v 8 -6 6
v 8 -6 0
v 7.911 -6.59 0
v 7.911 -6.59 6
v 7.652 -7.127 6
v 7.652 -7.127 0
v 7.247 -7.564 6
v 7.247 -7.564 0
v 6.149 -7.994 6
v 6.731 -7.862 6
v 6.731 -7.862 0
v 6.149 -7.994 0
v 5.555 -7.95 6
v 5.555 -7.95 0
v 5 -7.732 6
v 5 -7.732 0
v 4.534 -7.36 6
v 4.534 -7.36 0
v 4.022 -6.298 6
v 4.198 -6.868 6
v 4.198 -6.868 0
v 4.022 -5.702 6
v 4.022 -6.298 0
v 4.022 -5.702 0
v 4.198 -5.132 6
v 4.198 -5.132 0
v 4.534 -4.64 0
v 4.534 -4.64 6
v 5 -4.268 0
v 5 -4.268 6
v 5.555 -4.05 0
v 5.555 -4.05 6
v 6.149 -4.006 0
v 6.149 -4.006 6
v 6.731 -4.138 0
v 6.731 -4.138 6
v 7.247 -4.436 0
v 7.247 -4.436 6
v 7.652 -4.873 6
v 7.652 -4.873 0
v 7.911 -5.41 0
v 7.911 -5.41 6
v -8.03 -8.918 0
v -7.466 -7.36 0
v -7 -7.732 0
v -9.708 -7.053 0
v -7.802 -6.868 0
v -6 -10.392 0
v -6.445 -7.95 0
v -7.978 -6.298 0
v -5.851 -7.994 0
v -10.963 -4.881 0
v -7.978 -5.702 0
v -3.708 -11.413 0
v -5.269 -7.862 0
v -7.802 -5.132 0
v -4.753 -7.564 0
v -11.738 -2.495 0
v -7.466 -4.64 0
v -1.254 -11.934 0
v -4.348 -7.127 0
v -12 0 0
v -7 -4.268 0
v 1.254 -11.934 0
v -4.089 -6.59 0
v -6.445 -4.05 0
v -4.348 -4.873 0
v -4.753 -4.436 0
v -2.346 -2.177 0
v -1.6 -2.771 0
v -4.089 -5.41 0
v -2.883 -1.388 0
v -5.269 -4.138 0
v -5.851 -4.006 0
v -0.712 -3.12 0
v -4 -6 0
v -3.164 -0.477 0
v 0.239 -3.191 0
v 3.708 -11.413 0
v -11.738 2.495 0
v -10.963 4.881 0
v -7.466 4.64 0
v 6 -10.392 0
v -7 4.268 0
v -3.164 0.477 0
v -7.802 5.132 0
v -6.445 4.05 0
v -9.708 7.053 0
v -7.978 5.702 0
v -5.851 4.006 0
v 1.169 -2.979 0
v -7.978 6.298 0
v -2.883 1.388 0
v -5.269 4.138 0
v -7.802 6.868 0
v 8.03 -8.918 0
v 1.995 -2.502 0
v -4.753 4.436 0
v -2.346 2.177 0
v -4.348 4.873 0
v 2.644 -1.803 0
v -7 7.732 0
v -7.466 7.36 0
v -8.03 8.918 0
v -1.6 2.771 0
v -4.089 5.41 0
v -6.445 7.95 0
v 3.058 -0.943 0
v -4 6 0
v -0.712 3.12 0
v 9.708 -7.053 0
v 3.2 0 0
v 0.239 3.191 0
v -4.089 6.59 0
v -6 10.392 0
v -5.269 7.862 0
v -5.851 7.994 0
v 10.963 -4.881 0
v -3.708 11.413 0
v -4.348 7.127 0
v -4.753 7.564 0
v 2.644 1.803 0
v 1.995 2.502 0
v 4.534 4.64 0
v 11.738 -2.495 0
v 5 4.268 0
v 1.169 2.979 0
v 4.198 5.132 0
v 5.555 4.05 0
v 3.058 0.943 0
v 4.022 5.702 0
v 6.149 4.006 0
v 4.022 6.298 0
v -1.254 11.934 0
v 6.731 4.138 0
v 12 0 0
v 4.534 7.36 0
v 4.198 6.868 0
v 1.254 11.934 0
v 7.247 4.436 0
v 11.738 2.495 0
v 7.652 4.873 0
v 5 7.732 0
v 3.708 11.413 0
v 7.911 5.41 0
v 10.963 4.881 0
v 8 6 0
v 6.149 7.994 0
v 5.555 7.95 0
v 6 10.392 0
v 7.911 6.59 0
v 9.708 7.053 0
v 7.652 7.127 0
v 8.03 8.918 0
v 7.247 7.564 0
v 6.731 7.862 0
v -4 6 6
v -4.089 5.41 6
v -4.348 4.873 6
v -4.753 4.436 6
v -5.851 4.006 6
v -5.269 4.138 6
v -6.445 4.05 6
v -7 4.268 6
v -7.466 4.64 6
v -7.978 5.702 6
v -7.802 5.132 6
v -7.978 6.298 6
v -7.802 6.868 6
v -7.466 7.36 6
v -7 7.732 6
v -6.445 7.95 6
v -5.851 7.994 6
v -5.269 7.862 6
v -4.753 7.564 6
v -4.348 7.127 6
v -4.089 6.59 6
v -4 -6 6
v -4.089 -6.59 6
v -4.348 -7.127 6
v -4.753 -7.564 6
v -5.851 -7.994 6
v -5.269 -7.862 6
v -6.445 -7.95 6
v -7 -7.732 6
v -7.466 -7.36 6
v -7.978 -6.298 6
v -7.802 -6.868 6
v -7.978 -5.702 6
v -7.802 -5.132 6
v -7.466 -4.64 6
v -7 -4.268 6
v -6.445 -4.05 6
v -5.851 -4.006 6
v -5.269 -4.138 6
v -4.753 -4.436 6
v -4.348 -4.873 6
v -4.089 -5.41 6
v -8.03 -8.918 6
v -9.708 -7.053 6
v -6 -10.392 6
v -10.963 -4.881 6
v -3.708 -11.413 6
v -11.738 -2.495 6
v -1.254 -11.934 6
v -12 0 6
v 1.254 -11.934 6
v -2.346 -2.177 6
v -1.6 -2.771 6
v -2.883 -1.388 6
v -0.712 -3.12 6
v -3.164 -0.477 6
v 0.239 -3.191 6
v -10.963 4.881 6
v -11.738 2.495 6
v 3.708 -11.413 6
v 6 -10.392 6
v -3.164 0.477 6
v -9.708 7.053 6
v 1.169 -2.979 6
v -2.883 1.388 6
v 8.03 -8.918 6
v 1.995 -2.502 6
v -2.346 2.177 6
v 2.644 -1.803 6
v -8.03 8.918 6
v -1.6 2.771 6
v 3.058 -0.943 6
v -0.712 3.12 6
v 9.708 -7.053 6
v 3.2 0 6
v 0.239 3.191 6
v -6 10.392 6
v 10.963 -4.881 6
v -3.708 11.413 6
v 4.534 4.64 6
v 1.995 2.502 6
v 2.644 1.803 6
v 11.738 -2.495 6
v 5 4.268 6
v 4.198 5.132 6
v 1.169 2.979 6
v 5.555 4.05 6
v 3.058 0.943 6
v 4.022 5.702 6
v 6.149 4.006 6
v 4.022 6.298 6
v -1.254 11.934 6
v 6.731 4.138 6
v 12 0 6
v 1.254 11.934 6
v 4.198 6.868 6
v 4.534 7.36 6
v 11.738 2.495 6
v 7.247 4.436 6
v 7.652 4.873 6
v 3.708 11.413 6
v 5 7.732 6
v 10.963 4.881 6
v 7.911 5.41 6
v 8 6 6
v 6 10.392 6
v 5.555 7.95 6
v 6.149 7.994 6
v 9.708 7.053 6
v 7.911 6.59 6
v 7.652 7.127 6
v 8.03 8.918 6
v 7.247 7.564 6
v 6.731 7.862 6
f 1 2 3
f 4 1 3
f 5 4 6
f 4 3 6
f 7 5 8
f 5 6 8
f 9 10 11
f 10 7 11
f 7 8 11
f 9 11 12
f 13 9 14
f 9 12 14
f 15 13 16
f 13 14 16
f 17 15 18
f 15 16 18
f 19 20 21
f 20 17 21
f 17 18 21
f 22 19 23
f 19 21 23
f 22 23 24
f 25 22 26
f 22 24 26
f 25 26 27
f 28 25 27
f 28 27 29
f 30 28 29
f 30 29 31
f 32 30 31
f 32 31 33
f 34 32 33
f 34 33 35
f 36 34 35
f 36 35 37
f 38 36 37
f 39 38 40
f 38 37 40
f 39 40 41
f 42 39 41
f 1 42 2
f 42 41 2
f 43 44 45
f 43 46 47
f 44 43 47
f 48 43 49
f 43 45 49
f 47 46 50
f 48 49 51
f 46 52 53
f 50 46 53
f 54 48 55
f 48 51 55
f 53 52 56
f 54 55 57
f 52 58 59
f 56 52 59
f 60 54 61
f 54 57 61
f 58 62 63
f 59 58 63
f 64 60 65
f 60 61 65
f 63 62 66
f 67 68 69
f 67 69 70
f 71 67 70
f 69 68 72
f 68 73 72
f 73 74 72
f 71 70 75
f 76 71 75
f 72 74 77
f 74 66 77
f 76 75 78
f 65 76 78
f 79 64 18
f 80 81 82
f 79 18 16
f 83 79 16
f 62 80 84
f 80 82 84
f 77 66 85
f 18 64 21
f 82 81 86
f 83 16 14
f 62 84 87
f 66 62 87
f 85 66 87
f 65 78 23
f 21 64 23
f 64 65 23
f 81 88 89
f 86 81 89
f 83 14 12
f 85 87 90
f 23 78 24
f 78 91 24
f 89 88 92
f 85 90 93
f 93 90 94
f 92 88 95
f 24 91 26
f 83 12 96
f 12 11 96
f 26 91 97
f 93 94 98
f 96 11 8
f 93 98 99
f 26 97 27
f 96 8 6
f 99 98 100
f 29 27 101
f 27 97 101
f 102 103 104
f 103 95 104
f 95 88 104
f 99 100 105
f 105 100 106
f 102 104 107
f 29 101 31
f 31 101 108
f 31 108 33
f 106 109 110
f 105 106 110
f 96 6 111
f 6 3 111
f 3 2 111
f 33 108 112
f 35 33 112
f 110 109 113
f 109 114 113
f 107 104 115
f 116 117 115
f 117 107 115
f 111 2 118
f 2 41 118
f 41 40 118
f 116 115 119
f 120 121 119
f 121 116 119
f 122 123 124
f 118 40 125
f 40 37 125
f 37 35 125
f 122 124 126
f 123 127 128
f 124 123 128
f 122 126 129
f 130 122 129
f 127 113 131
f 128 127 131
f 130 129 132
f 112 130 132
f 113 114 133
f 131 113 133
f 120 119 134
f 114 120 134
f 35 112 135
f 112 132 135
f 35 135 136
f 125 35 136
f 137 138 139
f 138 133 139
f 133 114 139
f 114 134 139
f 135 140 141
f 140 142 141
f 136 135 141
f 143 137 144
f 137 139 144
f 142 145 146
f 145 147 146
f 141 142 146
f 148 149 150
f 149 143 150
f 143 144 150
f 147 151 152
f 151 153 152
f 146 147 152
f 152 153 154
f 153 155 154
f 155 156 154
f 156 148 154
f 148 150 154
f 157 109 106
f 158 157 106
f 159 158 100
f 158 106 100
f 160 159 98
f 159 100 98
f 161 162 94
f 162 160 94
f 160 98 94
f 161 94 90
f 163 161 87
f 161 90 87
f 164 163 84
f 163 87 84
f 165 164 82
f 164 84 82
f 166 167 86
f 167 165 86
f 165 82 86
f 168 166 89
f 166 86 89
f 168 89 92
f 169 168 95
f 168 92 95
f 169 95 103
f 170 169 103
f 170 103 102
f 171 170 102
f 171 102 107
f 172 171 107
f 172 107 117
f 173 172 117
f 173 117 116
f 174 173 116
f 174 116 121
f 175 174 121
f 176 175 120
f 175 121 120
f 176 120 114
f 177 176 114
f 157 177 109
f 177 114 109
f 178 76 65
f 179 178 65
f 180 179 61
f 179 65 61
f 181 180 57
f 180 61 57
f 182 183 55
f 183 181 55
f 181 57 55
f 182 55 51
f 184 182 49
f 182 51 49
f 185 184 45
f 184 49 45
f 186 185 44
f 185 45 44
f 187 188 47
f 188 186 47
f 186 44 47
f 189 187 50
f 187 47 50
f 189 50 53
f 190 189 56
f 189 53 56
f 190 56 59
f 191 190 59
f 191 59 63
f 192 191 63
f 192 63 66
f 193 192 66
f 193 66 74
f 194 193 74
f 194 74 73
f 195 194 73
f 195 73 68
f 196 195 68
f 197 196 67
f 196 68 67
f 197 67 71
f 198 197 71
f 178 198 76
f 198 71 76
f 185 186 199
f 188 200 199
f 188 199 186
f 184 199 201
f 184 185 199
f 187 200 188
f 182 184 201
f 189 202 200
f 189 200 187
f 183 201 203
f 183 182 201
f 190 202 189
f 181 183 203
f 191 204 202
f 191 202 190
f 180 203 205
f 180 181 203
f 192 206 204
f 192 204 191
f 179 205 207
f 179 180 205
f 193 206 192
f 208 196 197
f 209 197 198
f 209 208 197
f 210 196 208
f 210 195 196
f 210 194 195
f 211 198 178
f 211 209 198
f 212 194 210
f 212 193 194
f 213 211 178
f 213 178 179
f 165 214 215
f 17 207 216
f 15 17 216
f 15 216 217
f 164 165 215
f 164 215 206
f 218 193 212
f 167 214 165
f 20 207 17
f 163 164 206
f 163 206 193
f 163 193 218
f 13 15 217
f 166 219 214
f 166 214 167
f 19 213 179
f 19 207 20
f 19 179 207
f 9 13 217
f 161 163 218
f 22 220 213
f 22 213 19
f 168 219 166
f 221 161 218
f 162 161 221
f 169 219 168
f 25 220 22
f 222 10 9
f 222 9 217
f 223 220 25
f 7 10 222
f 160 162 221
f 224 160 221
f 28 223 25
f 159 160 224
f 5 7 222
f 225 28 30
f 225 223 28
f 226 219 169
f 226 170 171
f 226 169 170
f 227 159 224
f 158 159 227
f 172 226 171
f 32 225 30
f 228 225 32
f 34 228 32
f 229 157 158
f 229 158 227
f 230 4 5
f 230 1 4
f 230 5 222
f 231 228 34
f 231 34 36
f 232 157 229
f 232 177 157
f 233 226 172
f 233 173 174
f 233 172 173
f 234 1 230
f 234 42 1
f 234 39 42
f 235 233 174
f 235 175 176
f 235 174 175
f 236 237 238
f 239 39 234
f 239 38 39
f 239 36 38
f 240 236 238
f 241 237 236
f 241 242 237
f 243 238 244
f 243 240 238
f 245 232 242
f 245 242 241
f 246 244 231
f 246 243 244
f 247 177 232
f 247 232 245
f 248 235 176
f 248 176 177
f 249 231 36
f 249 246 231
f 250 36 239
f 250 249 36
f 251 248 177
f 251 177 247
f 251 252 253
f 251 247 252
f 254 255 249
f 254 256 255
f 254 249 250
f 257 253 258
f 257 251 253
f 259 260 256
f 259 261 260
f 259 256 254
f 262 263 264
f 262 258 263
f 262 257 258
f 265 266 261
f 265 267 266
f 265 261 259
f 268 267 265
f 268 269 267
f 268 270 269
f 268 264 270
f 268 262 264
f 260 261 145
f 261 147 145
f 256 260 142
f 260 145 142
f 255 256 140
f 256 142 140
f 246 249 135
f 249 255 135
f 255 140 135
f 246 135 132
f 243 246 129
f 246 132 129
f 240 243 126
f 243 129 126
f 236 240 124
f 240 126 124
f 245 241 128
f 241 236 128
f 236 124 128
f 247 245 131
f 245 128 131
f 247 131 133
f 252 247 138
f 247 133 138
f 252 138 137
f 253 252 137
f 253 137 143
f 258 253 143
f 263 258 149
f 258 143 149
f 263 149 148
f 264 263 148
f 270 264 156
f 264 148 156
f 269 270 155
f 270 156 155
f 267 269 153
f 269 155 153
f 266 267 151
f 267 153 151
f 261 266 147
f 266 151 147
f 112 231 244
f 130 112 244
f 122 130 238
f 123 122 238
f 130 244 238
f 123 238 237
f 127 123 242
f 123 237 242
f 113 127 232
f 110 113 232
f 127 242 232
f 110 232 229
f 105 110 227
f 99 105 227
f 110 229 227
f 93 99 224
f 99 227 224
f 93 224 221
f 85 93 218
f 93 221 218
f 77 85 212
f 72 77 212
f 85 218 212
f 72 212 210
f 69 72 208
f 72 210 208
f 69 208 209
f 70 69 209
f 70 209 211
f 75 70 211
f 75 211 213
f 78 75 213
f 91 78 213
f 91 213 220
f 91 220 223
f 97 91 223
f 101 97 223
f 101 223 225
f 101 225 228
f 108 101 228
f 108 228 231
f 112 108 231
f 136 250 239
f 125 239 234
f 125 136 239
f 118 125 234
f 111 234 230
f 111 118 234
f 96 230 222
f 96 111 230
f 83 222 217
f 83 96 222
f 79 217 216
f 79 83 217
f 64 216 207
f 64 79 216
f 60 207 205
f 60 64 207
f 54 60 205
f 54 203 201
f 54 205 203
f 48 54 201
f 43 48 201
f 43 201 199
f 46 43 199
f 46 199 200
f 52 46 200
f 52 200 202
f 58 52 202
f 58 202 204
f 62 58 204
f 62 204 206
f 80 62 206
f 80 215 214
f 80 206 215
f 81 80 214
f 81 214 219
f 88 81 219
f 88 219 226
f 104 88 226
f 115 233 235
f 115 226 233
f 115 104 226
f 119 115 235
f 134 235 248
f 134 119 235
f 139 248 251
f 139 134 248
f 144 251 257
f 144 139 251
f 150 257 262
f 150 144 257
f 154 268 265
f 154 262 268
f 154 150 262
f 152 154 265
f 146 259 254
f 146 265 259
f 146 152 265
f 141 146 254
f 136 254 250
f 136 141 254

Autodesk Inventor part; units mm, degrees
ref_plane "YZ Plane" through (0, 0, 0) normal (1, 0, 0) x (0, 1, 0)
ref_plane "XZ Plane" through (0, 0, 0) normal (0, 1, 0) x (-1, 0, 0)
ref_plane "XY Plane" through (0, 0, 0) normal (0, 0, 1) x (1, 0, 0)
sketch "Sketch1" plane through (0, 0, 0) normal (0, 0, 1) x (1, 0, 0)
  circle A0 centre (0, 0) radius 12
  circle A1 centre (-6, 6) radius 2
  circle A2 centre (-6, -6) radius 2
  circle A3 centre (6, -6) radius 2
  circle A4 centre (6, 6) radius 2
  dimension "d0" = 24
  dimension "d1" = 4
  dimension "d2" = 6
  dimension "d3" = 6
  dimension "d6" = 360
extrude "Extrusion1" add sketch "Sketch1" along normal blind 6
sketch "Sketch2" plane through (0, 0, 6) normal (0, 0, 1) x (1, 0, 0)
  circle A0 centre (0, 0) radius 3.2
  dimension "d10" = 6.4
extrude "Extrusion2" cut sketch "Sketch2" against normal through all
properties part number "MountingPiece"
